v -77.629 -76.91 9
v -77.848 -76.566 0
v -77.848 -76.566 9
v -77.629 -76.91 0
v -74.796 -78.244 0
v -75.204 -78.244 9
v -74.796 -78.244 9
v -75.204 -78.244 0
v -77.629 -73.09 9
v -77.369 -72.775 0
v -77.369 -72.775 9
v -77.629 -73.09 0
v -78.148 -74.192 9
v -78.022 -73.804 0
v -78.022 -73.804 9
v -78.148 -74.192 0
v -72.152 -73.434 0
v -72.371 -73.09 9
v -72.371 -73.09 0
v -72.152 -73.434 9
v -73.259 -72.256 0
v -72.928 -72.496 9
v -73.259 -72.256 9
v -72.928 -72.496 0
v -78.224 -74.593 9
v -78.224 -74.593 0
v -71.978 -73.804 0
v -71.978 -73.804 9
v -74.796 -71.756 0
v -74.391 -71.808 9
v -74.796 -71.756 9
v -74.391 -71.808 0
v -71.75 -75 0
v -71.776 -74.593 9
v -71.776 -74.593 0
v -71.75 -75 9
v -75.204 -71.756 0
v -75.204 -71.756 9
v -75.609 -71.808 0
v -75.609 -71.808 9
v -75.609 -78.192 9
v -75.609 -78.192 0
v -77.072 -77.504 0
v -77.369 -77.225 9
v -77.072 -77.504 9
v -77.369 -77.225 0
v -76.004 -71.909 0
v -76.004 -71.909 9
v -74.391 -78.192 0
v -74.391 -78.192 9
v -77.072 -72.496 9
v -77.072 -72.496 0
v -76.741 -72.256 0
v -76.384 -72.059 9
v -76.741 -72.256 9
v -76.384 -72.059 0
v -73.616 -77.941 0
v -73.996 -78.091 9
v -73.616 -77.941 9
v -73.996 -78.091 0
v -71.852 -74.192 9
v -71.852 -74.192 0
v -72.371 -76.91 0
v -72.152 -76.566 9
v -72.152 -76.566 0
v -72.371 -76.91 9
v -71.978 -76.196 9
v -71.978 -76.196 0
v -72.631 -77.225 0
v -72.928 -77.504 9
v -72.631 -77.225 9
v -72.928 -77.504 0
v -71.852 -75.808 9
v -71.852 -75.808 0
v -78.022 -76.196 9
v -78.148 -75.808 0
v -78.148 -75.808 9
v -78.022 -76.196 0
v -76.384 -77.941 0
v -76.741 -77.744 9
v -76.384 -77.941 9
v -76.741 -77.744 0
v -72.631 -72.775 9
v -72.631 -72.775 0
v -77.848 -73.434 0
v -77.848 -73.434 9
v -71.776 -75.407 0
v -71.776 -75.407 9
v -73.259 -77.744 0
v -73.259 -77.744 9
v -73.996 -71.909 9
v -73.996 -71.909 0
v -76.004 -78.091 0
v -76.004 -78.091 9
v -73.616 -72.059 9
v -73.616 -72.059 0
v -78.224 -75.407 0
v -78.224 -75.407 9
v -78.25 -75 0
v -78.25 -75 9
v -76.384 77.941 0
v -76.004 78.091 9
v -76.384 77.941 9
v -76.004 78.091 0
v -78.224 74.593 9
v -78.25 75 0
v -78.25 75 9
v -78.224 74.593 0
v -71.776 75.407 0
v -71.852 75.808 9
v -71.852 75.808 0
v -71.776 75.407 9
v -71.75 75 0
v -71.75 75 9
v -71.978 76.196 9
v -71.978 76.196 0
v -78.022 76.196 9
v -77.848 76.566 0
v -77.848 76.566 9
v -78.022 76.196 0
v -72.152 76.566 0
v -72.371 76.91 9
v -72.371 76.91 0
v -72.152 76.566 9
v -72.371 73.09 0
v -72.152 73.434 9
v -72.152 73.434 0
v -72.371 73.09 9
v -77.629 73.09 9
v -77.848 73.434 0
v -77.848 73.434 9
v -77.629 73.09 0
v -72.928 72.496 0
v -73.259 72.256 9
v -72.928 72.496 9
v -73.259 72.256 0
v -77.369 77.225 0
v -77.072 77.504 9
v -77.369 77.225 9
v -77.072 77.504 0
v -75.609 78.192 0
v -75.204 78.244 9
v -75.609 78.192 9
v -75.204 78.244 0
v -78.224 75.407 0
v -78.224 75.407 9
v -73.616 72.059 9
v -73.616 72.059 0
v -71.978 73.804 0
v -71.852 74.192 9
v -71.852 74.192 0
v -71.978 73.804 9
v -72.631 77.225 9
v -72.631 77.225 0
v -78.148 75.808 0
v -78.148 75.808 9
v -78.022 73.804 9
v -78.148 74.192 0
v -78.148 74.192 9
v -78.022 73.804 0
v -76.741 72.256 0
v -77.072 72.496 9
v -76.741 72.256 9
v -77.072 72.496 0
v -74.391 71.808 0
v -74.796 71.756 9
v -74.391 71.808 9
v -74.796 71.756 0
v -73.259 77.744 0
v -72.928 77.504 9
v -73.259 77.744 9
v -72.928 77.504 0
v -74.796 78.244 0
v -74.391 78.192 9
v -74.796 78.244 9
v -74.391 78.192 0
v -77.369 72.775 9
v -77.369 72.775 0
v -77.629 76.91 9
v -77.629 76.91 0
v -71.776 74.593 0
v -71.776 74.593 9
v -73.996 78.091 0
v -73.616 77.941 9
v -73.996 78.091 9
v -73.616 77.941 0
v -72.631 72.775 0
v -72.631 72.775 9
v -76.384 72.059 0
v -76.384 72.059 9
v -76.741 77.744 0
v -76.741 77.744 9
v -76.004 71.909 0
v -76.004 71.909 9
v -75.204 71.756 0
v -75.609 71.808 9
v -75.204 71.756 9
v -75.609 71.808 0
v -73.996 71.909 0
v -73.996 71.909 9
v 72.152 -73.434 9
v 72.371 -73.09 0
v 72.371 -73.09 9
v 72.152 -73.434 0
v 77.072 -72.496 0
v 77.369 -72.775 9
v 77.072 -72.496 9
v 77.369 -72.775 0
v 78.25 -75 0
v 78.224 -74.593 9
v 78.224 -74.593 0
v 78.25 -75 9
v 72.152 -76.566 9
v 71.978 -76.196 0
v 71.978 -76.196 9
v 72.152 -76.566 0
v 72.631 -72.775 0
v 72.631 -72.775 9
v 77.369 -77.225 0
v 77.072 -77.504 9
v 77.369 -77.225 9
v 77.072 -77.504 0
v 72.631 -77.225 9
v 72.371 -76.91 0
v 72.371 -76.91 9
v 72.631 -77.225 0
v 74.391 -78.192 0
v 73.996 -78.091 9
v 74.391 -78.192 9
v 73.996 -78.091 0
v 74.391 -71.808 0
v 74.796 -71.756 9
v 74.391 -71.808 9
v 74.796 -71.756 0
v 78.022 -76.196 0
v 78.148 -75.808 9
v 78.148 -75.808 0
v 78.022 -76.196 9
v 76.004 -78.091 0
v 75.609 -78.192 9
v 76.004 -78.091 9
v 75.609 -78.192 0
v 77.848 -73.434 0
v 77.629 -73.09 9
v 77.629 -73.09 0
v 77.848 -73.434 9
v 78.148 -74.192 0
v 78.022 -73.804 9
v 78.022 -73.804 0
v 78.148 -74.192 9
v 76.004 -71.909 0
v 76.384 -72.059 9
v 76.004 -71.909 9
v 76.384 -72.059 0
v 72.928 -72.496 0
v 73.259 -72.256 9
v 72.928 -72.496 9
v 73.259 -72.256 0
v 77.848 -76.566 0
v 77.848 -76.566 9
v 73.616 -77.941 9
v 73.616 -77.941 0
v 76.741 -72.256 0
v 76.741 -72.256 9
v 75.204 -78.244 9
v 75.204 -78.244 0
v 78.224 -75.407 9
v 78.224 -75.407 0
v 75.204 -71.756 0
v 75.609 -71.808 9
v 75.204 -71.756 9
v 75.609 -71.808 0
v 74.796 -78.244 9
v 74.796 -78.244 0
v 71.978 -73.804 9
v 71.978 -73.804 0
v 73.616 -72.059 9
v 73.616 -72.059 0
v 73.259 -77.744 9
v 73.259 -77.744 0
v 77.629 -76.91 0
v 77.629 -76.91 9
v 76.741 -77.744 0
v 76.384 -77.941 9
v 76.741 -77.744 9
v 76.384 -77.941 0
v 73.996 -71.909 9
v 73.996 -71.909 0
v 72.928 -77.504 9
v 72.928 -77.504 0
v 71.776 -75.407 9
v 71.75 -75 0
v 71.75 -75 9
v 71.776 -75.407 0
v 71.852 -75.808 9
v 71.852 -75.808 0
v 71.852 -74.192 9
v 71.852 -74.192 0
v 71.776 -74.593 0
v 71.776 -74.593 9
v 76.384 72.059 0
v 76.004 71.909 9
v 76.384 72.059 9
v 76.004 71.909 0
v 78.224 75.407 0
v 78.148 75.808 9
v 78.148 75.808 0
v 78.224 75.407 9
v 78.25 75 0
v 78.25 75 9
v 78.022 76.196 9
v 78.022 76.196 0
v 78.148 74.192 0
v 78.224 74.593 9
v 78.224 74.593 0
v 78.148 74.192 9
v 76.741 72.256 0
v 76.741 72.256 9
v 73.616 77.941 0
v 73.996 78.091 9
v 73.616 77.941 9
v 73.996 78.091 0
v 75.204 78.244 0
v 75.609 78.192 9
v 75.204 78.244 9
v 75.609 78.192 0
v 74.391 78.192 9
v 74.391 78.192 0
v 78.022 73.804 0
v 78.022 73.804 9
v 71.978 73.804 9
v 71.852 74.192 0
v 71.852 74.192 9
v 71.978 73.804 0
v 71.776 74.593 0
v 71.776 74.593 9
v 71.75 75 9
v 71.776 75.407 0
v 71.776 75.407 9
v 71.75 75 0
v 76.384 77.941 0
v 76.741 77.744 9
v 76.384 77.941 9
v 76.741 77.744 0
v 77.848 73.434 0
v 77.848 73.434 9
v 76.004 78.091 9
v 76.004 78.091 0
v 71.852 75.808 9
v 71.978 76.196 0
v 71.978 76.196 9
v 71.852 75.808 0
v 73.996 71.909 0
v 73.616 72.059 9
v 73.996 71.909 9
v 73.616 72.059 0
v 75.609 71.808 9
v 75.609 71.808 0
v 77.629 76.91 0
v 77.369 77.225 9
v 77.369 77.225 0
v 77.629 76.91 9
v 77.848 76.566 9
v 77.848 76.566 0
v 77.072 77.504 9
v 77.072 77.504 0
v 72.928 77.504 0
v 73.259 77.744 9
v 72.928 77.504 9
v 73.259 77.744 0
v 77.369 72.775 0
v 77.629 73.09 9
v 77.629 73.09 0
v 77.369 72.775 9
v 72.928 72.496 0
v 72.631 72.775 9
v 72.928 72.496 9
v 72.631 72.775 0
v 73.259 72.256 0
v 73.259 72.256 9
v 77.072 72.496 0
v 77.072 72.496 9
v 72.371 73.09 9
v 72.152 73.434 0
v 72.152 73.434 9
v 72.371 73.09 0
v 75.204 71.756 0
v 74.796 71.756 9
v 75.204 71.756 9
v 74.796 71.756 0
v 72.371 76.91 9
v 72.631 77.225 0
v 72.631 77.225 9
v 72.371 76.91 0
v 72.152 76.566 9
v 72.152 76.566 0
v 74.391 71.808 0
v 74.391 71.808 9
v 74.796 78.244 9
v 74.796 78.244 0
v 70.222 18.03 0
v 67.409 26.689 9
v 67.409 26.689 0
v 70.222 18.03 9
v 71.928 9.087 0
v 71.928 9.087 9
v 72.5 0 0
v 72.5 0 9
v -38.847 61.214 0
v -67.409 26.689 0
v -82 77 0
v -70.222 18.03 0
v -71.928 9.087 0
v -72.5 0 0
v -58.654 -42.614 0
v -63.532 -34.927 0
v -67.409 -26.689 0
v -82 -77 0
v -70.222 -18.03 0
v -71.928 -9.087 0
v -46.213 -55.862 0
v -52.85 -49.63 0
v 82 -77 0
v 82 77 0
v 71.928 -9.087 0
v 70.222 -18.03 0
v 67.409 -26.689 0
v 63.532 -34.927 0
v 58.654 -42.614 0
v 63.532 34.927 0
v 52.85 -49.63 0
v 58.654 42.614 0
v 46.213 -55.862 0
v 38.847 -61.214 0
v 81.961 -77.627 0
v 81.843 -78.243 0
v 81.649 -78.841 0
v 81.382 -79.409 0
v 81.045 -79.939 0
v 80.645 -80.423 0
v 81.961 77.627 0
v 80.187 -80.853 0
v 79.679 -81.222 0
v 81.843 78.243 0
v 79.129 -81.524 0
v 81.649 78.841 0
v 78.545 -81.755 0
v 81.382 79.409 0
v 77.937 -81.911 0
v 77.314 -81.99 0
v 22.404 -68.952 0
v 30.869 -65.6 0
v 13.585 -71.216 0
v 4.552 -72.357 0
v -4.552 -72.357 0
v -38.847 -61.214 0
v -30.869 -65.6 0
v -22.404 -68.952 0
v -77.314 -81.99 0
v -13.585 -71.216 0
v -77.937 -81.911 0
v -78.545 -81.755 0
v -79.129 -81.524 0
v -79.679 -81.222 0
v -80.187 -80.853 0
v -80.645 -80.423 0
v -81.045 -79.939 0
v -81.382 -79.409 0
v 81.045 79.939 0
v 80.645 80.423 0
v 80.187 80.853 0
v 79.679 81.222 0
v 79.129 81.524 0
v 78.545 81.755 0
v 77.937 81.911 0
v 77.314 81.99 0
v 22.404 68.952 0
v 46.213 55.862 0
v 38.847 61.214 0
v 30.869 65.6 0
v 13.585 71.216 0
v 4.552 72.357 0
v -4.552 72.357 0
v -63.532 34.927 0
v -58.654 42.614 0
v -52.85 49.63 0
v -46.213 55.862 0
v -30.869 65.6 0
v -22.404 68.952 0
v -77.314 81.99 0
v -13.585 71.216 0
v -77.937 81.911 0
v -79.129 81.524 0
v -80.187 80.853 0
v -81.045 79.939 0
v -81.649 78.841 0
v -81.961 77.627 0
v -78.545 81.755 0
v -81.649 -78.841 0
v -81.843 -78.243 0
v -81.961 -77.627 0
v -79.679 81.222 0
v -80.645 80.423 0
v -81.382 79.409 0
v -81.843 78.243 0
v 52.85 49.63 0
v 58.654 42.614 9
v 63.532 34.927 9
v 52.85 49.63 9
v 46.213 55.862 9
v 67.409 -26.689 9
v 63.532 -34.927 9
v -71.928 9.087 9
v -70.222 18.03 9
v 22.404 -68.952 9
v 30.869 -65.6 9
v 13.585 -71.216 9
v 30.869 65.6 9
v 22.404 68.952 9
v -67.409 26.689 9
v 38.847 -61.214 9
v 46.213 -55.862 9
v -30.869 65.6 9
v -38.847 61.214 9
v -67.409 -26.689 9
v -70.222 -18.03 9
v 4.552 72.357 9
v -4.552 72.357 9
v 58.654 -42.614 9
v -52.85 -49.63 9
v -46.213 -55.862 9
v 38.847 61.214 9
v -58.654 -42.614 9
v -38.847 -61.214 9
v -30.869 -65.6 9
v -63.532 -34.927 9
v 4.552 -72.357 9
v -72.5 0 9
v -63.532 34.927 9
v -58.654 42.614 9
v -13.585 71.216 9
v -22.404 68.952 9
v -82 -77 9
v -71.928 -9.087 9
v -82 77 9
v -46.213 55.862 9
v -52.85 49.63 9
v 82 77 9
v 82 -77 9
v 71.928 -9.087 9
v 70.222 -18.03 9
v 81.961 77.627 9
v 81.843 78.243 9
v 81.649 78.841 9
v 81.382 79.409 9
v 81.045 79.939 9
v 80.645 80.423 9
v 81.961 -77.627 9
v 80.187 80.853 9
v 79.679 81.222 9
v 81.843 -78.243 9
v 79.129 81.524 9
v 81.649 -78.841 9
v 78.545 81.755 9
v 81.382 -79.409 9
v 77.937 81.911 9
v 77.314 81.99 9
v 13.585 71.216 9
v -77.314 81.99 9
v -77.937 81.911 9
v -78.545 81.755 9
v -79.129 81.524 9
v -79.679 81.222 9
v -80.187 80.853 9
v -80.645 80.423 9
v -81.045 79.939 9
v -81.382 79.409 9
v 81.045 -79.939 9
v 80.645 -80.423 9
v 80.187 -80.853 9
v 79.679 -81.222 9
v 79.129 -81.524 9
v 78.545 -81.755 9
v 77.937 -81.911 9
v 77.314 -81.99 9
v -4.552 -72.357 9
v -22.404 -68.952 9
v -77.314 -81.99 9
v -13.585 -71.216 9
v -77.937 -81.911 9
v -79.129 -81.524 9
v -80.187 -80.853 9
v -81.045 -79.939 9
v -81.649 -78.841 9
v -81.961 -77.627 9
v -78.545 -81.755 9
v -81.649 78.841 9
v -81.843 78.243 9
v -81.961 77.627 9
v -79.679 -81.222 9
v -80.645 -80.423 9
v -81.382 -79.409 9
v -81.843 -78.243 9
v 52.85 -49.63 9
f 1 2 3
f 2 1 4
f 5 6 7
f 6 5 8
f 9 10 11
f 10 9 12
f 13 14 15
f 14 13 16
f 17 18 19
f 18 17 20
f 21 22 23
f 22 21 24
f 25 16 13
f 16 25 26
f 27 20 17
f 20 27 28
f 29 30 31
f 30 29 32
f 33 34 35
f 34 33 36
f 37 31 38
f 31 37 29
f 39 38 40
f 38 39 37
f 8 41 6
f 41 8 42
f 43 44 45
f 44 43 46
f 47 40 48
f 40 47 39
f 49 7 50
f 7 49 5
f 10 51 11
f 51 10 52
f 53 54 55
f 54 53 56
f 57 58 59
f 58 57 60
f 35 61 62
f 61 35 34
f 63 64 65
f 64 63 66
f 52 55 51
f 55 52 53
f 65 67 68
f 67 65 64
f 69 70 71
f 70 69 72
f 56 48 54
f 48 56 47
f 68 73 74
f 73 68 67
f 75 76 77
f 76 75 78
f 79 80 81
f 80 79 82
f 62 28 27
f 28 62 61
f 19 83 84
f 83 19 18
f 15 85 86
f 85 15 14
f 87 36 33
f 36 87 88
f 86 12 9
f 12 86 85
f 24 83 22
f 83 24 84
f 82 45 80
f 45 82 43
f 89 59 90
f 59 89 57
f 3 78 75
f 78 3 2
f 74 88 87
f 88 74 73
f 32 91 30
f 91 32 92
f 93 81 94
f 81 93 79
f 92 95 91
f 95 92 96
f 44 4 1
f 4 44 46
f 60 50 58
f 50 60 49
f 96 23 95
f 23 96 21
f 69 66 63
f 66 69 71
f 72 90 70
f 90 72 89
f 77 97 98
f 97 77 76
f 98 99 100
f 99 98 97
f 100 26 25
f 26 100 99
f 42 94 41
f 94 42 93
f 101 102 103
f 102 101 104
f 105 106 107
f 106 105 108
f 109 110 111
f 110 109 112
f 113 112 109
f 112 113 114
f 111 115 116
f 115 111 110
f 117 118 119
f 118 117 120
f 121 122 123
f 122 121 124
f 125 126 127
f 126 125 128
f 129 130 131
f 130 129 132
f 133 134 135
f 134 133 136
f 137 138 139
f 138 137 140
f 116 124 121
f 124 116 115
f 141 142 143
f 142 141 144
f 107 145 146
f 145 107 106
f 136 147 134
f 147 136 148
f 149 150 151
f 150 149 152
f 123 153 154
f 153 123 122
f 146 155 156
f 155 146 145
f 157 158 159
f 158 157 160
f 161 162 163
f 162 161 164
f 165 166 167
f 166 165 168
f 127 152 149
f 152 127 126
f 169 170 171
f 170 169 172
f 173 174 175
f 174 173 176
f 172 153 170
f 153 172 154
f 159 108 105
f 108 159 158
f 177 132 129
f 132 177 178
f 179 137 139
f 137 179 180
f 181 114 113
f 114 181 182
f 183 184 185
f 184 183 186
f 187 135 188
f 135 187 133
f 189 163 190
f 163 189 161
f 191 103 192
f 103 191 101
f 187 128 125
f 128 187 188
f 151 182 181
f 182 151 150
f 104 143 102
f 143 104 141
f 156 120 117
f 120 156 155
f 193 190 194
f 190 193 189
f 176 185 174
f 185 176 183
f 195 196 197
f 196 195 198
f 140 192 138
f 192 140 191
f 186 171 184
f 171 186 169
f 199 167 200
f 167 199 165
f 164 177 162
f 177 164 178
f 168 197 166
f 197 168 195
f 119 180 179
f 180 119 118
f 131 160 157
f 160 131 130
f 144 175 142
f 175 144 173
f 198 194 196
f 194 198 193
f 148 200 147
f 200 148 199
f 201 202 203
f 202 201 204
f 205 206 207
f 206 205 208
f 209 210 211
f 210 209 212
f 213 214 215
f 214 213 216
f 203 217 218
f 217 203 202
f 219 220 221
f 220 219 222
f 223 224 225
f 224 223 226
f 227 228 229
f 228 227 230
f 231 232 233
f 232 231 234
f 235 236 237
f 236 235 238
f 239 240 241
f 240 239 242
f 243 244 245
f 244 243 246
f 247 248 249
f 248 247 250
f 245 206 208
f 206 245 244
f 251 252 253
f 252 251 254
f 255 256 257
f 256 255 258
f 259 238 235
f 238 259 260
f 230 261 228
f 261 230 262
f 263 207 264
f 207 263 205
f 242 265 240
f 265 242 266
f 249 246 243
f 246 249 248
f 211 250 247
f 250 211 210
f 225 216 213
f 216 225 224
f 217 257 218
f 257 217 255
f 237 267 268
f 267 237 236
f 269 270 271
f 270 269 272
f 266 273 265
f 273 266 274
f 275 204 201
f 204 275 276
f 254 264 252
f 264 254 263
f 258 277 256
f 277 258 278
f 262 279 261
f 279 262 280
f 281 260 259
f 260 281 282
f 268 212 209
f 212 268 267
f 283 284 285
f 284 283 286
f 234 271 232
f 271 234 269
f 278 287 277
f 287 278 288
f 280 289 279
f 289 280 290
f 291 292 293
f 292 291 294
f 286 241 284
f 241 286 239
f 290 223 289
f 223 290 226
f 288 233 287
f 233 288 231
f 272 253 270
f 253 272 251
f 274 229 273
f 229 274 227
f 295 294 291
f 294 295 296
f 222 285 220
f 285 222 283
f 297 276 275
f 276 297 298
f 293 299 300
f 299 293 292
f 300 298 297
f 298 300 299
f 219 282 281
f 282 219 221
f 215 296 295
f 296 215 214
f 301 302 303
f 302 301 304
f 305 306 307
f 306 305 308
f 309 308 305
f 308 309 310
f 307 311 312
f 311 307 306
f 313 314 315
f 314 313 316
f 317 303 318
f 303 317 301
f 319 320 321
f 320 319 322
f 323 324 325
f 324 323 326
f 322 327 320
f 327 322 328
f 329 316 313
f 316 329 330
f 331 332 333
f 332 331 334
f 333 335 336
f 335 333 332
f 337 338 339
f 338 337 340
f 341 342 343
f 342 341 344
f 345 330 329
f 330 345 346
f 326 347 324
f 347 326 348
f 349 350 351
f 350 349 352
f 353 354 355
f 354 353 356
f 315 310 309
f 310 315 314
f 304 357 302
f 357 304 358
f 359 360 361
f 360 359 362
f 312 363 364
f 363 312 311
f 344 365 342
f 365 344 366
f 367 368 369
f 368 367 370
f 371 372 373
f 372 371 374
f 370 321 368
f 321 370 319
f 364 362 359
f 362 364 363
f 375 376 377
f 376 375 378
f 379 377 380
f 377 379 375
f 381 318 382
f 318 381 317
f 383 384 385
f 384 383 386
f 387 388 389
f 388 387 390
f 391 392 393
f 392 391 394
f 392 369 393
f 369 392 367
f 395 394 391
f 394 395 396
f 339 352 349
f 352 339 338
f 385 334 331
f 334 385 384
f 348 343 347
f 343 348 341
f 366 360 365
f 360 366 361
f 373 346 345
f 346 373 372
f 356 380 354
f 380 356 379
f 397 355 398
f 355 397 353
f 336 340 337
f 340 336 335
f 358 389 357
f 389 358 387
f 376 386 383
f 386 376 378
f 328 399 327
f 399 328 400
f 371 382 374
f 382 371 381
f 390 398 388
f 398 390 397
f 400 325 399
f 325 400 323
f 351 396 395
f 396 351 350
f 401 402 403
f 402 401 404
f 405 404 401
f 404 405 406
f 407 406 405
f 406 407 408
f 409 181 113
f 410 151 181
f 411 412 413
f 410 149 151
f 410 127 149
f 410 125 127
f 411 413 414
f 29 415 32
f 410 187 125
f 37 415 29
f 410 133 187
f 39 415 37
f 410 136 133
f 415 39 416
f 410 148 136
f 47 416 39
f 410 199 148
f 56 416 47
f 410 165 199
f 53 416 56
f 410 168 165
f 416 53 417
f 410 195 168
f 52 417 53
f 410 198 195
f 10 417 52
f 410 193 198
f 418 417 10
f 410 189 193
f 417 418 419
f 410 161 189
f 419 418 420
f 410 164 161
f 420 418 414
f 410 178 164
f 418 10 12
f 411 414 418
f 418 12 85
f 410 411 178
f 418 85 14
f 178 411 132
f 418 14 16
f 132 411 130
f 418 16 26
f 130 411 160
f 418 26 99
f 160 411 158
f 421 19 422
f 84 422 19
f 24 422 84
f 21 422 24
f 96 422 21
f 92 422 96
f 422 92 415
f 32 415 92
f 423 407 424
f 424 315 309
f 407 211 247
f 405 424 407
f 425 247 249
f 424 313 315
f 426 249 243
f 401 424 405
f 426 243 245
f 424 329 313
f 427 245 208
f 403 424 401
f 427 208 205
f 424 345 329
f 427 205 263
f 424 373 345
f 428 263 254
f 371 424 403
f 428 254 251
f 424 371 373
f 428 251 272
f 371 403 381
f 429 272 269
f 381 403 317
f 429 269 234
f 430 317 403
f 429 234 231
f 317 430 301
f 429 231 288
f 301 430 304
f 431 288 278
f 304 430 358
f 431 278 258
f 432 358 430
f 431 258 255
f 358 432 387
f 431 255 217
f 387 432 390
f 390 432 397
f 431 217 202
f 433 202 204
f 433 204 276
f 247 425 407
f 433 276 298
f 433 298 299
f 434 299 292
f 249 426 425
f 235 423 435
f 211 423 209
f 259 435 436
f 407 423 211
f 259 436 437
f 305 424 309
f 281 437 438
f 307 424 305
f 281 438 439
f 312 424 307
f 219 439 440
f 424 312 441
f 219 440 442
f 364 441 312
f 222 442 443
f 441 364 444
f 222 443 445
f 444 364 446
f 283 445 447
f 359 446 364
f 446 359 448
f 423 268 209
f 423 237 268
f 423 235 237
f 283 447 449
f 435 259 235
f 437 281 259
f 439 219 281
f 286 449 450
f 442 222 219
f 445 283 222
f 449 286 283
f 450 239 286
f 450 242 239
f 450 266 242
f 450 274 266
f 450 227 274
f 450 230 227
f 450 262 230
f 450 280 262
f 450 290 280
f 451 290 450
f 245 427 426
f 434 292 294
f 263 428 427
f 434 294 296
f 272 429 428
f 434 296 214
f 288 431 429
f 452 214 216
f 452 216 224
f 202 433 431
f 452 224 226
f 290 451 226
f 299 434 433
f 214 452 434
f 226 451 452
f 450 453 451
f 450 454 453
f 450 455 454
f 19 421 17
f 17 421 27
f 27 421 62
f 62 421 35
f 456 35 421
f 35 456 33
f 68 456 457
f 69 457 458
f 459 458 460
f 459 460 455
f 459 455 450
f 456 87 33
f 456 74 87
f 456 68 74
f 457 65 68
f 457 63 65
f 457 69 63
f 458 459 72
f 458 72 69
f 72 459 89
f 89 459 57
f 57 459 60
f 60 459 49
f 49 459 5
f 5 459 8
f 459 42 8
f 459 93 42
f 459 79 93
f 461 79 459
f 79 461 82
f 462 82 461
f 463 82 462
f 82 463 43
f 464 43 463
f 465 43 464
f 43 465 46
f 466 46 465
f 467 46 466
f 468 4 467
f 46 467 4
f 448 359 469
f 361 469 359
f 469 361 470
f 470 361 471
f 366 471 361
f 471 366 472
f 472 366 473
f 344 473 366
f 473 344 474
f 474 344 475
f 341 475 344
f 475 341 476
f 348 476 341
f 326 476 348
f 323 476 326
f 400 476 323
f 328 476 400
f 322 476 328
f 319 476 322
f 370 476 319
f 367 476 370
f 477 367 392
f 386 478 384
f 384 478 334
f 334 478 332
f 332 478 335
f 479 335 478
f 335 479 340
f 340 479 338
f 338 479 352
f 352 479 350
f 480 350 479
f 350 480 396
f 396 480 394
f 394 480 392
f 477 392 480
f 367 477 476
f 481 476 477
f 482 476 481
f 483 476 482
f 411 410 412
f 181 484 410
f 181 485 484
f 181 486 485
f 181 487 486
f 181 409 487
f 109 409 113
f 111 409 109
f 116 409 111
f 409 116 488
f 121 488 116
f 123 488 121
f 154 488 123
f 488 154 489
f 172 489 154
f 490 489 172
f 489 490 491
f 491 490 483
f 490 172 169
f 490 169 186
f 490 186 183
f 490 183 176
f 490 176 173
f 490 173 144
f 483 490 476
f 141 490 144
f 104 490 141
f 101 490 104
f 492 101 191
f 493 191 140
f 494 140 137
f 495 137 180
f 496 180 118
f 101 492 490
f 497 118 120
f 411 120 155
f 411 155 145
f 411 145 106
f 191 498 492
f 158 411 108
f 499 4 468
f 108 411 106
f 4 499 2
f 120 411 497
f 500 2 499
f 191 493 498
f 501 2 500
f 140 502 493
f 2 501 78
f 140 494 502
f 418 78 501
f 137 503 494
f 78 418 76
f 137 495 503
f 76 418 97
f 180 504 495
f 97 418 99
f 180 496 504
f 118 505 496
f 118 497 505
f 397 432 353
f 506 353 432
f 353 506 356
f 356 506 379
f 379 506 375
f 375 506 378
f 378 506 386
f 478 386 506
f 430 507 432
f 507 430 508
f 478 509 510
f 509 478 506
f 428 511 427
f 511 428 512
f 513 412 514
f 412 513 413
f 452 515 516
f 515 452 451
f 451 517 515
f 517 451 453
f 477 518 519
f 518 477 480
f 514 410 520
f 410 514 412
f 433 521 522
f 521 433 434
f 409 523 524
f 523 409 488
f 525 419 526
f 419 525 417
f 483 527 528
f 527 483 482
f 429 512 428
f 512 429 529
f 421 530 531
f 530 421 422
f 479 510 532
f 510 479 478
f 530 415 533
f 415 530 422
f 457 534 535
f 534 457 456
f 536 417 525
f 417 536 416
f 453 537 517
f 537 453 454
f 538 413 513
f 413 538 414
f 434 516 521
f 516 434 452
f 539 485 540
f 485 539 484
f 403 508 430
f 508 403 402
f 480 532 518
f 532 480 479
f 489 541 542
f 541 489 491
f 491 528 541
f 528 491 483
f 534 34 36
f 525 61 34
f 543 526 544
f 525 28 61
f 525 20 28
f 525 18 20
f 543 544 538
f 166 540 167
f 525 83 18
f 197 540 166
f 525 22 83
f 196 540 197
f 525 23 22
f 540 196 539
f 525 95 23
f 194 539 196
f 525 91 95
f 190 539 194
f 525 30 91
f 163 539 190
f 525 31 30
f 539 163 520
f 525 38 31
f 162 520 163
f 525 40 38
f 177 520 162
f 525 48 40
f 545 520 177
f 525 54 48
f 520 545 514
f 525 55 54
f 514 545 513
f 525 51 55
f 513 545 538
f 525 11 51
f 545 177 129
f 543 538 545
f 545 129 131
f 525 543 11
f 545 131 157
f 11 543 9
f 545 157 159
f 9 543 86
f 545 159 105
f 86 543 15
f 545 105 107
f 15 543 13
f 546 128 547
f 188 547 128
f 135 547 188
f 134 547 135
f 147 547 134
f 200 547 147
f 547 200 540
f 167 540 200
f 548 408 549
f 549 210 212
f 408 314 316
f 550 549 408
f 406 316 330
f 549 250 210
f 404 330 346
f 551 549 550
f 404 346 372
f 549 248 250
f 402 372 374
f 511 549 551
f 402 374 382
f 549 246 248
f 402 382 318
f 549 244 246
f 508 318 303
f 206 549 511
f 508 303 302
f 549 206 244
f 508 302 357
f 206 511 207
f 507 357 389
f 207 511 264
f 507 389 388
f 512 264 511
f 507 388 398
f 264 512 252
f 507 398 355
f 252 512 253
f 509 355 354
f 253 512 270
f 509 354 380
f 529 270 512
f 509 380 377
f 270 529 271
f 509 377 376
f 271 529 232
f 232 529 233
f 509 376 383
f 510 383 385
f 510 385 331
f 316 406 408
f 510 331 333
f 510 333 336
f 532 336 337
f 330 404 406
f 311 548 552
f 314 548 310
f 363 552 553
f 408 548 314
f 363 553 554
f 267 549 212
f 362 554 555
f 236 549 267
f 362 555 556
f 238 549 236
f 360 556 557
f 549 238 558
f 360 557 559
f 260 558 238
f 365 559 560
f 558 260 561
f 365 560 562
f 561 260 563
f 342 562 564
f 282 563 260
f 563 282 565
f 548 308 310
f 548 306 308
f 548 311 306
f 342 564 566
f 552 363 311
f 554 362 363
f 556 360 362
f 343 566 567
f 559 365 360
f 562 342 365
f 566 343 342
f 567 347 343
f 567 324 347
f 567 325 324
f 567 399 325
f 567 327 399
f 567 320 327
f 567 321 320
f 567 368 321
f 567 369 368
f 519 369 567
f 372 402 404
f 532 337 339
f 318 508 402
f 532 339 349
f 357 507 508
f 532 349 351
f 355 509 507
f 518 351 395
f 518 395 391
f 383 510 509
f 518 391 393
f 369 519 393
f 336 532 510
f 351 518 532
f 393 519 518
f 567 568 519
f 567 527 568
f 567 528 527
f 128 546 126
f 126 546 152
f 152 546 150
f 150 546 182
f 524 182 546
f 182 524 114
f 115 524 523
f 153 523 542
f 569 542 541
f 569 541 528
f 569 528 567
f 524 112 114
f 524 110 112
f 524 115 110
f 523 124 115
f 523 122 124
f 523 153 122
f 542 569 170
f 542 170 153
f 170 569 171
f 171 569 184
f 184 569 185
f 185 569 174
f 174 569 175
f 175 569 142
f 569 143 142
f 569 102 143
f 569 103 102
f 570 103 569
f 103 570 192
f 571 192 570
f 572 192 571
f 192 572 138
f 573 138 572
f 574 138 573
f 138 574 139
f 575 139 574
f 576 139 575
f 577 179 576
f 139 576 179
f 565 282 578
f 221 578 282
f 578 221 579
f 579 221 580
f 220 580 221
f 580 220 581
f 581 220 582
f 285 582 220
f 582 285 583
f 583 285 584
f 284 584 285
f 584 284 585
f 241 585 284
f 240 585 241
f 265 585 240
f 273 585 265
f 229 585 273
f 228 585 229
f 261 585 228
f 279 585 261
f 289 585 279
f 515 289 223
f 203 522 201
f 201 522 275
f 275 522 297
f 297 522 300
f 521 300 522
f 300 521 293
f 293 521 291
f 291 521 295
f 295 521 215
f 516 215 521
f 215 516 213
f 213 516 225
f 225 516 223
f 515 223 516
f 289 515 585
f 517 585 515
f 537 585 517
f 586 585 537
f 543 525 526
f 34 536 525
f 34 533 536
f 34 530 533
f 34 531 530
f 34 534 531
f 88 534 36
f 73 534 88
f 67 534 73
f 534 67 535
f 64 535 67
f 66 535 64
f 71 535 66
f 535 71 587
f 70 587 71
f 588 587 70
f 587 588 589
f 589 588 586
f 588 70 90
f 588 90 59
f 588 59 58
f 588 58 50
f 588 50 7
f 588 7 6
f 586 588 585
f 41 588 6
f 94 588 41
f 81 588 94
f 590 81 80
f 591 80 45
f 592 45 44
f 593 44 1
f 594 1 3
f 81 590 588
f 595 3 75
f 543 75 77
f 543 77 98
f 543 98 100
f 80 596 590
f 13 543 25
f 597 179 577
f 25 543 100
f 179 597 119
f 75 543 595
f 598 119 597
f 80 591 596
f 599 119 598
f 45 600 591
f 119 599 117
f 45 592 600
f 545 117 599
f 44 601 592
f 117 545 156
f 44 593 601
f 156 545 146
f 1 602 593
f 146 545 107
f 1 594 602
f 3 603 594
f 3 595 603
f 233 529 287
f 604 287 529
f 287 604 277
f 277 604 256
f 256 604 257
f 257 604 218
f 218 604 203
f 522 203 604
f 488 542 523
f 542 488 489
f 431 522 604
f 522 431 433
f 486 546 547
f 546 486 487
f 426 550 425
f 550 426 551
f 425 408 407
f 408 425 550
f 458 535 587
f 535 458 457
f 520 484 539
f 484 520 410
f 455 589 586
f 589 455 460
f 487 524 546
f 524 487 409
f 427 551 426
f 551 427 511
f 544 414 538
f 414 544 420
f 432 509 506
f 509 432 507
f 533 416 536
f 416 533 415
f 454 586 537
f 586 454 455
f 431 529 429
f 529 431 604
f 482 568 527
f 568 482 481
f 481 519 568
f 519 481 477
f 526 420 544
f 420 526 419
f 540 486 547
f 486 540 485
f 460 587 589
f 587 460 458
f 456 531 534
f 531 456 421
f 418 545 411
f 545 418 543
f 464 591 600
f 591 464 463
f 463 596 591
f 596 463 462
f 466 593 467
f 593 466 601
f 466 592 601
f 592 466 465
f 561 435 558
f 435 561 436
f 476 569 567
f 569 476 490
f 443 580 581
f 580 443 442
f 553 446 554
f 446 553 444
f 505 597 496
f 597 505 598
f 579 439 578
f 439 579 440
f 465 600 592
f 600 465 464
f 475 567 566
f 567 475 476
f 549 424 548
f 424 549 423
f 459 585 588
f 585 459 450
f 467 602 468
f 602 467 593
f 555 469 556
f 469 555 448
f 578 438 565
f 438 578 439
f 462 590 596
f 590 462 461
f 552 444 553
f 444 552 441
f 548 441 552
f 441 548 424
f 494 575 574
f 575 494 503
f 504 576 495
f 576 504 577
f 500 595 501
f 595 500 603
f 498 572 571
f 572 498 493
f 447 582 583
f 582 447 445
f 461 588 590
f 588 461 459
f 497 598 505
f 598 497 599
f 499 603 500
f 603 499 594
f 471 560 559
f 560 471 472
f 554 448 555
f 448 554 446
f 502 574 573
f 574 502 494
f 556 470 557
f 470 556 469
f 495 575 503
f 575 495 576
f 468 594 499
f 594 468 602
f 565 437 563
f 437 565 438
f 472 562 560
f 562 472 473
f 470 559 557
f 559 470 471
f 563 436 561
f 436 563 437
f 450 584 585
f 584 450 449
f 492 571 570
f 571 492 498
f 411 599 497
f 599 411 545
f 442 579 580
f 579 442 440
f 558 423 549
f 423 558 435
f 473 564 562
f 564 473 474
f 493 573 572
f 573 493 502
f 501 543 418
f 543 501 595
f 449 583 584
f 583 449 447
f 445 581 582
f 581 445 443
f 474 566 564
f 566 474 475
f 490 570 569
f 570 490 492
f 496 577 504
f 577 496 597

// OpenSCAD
$fn = 50;


difference() {
	union() {
		hull() {
			translate(v = [-77.0000000000, 77.0000000000, 0]) {
				cylinder(h = 9, r = 5);
			}
			translate(v = [77.0000000000, 77.0000000000, 0]) {
				cylinder(h = 9, r = 5);
			}
			translate(v = [-77.0000000000, -77.0000000000, 0]) {
				cylinder(h = 9, r = 5);
			}
			translate(v = [77.0000000000, -77.0000000000, 0]) {
				cylinder(h = 9, r = 5);
			}
		}
	}
	union() {
		#translate(v = [-75.0000000000, -75.0000000000, -100.0000000000]) {
			cylinder(h = 200, r = 3.2500000000);
		}
		#translate(v = [-75.0000000000, 75.0000000000, -100.0000000000]) {
			cylinder(h = 200, r = 3.2500000000);
		}
		#translate(v = [75.0000000000, -75.0000000000, -100.0000000000]) {
			cylinder(h = 200, r = 3.2500000000);
		}
		#translate(v = [75.0000000000, 75.0000000000, -100.0000000000]) {
			cylinder(h = 200, r = 3.2500000000);
		}
		#cylinder(h = 9, r = 72.5000000000);
	}
}
